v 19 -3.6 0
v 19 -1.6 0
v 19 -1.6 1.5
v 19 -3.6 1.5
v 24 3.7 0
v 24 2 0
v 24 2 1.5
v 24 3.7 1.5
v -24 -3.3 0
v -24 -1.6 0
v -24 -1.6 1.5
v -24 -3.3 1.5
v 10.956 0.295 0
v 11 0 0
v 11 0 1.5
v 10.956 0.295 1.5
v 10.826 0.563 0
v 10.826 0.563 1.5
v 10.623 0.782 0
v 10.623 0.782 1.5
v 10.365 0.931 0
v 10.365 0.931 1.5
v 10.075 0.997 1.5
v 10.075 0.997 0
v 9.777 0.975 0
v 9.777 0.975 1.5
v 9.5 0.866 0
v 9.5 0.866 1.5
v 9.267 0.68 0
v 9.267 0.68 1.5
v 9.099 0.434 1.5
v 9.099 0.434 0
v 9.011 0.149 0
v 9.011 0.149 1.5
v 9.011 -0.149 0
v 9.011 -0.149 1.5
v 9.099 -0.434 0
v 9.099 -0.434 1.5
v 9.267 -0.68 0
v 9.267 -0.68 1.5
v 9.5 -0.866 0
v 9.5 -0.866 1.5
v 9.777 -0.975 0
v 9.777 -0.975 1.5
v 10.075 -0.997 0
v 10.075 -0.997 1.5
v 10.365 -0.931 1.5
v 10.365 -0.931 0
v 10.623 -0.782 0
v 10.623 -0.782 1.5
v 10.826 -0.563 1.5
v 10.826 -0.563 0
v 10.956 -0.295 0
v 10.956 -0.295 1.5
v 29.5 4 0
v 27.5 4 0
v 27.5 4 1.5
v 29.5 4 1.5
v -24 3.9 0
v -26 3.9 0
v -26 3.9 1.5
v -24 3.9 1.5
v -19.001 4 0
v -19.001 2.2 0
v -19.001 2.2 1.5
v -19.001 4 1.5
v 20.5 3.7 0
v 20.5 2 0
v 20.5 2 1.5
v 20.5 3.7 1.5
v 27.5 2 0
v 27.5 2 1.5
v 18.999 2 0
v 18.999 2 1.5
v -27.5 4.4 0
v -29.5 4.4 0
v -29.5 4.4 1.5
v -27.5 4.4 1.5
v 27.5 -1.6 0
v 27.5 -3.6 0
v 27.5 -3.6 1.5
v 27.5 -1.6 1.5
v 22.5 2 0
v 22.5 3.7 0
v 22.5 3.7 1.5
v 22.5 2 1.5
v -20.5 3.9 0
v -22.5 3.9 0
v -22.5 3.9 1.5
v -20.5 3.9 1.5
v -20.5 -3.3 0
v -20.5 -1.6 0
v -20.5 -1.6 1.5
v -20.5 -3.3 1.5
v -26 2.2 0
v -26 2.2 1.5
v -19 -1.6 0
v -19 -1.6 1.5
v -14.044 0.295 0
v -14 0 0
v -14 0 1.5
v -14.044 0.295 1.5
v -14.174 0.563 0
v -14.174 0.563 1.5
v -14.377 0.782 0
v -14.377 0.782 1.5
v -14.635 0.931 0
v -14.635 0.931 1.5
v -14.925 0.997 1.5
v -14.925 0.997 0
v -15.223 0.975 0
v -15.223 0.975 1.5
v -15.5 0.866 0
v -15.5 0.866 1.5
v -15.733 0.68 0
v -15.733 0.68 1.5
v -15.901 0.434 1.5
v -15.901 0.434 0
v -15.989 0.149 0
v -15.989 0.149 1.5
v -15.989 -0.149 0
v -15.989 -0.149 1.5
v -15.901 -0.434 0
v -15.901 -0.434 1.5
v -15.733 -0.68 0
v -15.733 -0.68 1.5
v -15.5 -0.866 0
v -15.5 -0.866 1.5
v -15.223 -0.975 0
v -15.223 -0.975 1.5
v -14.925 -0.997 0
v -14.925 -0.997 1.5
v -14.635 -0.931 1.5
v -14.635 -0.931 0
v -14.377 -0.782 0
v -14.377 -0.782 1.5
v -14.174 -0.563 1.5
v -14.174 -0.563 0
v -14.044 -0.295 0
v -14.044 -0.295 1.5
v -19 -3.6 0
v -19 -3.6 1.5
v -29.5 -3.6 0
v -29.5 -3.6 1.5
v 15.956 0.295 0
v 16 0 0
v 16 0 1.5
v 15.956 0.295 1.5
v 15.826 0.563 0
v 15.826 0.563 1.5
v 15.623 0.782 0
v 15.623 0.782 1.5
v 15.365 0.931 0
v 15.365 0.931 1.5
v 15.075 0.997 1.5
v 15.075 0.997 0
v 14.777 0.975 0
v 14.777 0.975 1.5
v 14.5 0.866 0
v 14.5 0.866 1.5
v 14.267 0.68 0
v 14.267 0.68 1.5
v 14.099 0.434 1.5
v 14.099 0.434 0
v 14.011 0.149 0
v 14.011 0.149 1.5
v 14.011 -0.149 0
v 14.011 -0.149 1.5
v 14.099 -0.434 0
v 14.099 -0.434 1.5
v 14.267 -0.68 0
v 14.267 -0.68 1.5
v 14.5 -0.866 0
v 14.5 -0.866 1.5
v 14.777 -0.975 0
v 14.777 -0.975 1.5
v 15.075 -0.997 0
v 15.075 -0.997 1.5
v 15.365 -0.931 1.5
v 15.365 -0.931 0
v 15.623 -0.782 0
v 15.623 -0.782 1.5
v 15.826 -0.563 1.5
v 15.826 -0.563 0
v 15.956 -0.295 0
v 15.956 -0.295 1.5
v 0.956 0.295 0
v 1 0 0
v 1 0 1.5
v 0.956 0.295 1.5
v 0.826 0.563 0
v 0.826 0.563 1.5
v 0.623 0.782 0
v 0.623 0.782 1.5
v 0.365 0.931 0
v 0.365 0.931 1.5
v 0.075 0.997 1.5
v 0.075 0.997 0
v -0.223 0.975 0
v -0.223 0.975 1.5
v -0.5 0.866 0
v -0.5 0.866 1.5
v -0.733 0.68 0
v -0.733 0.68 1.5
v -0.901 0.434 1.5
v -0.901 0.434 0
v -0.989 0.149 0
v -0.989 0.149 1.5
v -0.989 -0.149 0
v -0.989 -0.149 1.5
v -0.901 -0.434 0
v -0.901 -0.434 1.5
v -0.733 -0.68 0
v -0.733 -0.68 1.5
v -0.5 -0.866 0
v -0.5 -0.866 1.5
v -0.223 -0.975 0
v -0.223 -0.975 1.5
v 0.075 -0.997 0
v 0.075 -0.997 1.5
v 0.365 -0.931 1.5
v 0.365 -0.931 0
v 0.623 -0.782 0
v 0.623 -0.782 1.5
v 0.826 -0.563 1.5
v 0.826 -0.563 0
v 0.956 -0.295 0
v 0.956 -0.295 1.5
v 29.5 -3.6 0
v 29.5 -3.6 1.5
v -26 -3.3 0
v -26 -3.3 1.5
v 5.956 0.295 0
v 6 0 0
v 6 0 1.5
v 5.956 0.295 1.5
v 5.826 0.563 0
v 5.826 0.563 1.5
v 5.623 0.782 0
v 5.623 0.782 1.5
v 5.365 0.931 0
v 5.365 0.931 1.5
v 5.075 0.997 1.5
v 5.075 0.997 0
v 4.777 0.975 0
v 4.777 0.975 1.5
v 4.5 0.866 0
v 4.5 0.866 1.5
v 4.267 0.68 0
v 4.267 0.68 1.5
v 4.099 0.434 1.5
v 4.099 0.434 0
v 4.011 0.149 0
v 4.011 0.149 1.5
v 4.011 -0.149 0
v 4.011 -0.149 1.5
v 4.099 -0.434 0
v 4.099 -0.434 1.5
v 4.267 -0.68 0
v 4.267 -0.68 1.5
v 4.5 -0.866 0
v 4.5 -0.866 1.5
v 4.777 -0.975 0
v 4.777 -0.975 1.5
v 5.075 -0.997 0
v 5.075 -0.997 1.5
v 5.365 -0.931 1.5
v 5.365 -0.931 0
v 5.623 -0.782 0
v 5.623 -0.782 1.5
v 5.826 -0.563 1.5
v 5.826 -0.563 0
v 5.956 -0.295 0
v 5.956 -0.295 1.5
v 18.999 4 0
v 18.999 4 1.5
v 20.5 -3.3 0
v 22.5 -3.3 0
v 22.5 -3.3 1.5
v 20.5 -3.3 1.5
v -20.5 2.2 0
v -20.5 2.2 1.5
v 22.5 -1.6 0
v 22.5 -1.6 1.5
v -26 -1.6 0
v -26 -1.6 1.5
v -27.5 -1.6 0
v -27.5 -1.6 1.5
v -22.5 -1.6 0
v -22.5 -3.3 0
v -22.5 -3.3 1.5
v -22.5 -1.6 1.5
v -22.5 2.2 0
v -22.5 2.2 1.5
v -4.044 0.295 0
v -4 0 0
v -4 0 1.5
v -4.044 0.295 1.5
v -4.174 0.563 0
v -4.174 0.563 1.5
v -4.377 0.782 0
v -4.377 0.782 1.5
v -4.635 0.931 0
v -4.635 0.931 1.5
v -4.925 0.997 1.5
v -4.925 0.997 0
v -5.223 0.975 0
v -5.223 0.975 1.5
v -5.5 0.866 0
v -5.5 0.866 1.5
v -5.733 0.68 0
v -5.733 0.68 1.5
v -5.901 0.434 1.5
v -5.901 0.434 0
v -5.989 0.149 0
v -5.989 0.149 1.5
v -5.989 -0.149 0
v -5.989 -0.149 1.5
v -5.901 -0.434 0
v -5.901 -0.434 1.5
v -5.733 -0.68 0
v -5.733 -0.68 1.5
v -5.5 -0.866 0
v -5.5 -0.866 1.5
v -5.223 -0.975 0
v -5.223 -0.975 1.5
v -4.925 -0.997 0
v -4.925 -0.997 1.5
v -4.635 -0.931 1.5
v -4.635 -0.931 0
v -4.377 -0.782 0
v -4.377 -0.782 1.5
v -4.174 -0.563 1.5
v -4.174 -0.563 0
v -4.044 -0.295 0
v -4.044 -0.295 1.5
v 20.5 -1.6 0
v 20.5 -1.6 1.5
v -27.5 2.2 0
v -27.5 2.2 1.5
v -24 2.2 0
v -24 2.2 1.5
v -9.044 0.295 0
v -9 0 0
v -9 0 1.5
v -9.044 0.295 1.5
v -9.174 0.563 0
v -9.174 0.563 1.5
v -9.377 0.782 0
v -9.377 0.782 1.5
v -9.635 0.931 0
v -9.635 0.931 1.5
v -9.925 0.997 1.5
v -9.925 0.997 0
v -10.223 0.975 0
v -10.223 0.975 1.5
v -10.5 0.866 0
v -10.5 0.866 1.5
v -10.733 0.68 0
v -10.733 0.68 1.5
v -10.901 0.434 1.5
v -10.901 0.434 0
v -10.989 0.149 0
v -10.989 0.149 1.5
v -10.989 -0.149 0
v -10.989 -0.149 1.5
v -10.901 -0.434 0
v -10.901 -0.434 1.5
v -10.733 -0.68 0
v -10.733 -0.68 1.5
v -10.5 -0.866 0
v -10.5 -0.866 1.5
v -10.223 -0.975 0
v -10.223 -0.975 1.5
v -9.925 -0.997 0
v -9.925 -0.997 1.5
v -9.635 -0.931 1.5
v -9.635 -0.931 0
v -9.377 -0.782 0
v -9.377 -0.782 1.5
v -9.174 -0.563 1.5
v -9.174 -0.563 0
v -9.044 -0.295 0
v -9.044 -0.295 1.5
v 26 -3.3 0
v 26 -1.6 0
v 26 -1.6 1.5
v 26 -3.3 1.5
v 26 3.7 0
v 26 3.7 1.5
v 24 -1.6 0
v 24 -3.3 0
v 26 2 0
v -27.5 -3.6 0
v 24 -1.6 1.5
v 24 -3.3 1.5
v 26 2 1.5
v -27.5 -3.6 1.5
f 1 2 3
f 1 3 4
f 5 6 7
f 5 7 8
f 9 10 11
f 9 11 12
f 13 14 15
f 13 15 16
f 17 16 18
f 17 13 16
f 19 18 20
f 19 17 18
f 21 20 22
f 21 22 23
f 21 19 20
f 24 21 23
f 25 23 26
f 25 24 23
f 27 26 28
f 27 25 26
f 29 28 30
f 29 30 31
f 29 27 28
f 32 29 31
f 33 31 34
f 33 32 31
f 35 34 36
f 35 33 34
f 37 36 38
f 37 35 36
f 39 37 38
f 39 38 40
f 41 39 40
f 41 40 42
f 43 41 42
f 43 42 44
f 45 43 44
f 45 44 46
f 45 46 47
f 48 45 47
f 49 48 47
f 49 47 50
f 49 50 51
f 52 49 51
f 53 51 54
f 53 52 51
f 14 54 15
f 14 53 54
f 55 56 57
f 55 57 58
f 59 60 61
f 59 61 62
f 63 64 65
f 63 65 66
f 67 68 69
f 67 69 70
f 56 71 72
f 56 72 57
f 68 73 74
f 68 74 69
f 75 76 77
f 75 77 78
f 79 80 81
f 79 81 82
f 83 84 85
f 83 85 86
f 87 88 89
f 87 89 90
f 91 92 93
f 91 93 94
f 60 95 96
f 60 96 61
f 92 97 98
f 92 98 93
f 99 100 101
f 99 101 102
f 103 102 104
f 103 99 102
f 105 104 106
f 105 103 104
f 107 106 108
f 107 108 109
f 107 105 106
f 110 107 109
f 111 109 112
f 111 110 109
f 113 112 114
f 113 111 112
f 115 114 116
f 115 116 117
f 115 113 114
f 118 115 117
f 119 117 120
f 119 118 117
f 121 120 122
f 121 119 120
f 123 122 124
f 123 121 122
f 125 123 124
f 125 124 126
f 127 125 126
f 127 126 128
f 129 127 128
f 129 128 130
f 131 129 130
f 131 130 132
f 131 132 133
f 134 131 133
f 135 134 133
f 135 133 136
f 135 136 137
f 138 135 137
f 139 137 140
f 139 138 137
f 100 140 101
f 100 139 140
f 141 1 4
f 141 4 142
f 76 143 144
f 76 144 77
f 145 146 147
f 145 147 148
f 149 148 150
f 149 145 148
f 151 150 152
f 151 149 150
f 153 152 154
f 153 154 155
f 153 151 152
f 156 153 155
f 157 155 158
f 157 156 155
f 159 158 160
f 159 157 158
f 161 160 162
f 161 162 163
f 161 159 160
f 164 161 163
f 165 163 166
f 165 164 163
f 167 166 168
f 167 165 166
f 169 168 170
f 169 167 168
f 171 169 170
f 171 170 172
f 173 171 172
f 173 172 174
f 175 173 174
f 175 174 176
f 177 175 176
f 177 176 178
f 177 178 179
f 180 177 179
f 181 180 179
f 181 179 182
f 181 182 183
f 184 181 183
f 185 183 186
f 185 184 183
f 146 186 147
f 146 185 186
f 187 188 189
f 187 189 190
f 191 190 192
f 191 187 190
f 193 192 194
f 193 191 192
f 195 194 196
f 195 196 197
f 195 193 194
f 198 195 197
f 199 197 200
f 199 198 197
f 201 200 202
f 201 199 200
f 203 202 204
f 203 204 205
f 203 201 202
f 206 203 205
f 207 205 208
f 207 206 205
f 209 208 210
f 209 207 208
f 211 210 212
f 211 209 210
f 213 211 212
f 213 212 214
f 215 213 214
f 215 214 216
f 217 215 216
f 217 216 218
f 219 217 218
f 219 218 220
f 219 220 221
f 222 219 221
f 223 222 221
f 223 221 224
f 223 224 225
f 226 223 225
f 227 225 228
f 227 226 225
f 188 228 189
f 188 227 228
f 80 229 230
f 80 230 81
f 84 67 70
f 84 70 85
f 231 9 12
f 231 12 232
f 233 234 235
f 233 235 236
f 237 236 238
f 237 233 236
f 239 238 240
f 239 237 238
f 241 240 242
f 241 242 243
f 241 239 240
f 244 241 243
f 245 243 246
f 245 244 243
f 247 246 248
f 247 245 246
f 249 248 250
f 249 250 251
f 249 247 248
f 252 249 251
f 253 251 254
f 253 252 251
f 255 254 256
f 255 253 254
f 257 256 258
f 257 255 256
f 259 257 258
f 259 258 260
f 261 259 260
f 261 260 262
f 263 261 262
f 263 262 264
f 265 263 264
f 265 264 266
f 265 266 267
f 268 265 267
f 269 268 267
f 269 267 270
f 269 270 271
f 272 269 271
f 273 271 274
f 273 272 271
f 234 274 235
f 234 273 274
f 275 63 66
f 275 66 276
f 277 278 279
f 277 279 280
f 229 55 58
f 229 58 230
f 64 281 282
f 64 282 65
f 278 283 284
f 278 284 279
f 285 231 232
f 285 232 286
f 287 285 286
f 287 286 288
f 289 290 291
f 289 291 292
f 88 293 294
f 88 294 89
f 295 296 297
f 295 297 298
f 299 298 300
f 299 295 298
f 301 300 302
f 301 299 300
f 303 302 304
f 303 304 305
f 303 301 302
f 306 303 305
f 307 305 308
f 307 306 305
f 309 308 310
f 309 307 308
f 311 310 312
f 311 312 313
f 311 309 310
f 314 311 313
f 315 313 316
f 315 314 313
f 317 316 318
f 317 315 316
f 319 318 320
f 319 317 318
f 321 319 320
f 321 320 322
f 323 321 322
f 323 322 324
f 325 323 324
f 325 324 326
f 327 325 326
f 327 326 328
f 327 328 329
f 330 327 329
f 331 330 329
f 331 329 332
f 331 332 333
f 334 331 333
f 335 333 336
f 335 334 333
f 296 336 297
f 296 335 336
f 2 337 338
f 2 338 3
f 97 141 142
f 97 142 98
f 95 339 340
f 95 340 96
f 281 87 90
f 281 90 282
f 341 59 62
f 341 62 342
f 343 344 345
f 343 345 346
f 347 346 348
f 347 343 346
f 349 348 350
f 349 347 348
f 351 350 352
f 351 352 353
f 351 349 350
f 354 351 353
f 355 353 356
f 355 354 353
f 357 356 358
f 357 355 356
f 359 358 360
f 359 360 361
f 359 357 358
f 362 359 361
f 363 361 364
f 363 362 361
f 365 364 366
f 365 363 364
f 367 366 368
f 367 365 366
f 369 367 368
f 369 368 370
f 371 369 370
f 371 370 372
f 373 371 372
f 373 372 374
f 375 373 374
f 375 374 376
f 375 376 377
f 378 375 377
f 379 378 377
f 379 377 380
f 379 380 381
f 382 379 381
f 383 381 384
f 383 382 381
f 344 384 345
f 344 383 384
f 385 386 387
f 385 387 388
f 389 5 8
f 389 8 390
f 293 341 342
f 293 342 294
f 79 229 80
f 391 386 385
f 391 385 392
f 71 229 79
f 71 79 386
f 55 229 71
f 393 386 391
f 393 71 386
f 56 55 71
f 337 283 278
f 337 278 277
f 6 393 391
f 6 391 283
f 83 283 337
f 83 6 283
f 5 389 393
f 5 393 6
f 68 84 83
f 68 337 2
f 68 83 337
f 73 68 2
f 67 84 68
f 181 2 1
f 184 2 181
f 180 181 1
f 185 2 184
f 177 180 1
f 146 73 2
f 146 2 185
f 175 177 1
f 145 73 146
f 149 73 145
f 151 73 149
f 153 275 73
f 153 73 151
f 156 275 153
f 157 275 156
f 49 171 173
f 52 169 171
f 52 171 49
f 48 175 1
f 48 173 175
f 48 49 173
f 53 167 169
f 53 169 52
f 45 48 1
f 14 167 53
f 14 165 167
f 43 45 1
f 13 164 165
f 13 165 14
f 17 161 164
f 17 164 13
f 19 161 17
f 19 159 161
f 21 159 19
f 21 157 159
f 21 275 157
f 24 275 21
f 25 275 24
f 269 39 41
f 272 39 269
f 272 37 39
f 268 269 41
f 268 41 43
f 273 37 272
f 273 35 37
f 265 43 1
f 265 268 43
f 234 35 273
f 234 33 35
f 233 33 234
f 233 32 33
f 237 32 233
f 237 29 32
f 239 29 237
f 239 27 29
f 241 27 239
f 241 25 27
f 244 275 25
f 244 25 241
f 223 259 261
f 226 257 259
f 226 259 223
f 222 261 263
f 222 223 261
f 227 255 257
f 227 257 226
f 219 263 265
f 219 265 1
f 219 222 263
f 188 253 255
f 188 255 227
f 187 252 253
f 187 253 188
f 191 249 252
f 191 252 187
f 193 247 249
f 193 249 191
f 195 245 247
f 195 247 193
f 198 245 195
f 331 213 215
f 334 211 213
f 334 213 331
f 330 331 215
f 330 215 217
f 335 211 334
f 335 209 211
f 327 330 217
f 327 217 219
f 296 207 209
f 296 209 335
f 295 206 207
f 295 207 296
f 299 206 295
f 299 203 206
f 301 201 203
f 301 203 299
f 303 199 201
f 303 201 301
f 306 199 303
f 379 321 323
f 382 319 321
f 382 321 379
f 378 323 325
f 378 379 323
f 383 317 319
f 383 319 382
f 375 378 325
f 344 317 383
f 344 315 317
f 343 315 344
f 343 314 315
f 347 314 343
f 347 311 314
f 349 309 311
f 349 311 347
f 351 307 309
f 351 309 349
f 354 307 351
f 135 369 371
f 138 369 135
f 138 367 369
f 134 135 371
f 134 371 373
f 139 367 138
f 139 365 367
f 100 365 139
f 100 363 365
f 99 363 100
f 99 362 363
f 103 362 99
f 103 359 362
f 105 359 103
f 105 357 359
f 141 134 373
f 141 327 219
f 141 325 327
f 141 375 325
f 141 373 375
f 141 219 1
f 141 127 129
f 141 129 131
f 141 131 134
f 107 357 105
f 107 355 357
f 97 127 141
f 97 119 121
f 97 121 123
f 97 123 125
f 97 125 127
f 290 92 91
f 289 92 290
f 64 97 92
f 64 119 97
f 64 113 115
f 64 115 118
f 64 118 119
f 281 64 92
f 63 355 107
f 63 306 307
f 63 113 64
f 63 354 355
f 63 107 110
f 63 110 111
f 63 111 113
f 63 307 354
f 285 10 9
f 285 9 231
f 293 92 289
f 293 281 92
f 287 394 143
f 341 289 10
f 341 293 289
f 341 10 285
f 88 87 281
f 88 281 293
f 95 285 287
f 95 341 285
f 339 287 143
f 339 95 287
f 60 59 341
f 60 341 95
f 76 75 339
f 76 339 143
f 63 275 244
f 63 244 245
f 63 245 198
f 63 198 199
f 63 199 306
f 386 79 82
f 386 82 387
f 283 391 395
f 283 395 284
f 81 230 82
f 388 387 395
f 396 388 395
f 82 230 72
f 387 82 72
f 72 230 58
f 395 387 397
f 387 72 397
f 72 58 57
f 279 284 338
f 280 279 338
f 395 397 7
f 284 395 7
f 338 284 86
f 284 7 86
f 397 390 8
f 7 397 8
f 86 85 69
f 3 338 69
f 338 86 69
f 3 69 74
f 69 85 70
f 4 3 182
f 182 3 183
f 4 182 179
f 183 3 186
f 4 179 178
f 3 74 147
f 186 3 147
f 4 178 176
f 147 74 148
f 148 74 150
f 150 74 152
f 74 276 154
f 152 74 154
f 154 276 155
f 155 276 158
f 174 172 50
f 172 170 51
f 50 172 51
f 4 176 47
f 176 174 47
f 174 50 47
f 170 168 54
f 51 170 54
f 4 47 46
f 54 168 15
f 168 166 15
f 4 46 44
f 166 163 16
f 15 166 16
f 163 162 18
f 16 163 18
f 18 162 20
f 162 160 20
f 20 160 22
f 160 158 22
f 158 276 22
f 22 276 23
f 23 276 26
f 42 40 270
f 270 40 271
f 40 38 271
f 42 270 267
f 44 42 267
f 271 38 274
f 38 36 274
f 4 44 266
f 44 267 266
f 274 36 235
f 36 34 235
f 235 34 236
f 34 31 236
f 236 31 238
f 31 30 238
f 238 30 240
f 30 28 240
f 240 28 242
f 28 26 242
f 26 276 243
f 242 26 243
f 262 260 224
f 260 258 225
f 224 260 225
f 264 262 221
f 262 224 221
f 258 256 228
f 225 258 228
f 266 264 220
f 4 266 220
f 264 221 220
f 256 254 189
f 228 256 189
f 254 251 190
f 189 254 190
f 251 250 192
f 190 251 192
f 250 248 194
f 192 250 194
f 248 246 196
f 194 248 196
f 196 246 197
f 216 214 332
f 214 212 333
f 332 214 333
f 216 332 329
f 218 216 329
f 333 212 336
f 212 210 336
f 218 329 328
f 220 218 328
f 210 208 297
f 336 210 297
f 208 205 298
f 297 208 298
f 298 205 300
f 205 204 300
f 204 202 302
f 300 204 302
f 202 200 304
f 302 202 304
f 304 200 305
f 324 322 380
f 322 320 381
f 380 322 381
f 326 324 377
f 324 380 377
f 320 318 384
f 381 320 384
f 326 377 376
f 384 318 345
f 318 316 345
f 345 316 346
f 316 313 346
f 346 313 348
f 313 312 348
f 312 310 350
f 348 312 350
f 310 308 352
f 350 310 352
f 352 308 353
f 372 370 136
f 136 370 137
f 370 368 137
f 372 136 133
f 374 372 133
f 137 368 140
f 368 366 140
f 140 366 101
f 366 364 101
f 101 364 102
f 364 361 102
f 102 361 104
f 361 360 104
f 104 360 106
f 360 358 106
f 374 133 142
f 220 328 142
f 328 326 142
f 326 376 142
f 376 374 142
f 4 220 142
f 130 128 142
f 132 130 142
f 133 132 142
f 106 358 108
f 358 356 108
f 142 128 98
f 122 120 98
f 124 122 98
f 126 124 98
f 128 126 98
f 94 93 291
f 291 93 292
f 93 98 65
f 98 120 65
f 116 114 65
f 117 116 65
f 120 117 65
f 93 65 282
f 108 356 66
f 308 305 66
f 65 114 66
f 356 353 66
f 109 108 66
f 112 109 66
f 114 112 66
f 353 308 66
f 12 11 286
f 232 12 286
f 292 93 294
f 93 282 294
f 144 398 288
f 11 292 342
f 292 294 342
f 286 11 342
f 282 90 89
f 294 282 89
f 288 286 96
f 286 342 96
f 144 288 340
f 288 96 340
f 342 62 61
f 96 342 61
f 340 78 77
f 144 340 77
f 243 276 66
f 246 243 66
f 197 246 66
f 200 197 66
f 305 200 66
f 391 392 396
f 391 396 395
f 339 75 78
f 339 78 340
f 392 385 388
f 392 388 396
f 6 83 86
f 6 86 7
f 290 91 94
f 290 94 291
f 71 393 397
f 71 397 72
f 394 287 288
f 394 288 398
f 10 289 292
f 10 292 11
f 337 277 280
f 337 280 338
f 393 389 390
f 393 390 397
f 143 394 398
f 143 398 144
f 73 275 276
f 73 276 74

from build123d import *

# Parameters (mm, degrees)
SKETCH_1_R      = 1
EXTRUDE_1_DEPTH = 1.5


with BuildPart() as part:
    # 草图1 → 凸台-拉伸1 (new body)
    with BuildSketch(Plane.XY):
        Polygon((-19.000504276, 4), (18.999495724, 4), (18.999495724, 2), (20.5, 2), (20.5, 3.7), (22.499555553, 3.7), (22.499555553, 2), (24.00005983, 2), (24.00005983, 3.7), (25.999615383, 3.7), (25.999615383, 2), (27.50011966, 2), (27.50011966, 4), (29.499675213, 4), (29.499675213, -3.6), (27.5, -3.6), (27.5, -1.6), (26, -1.6), (26, -3.3), (24, -3.3), (24, -1.6), (22.5, -1.6), (22.5, -3.3), (20.5, -3.3), (20.5, -1.6), (19, -1.6), (19, -3.6), (-19, -3.6), (-19, -1.6), (-20.5, -1.6), (-20.5, -3.3), (-22.5, -3.3), (-22.5, -1.6), (-24, -1.6), (-24, -3.3), (-26, -3.3), (-26, -1.6), (-27.5, -1.6), (-27.5, -3.6), (-29.5, -3.6), (-29.5, 4.4), (-27.5, 4.4), (-27.5, 2.2), (-26, 2.2), (-26, 3.9), (-24, 3.9), (-24, 2.2), (-22.5, 2.2), (-22.5, 3.9), (-20.5, 3.9), (-20.5, 2.2), (-19.000504276, 2.2), align=None)
        Circle(SKETCH_1_R, mode=Mode.SUBTRACT)
        with Locations((5, 0)):
            Circle(SKETCH_1_R, mode=Mode.SUBTRACT)
        with Locations((10, 0)):
            Circle(SKETCH_1_R, mode=Mode.SUBTRACT)
        with Locations((15, 0)):
            Circle(SKETCH_1_R, mode=Mode.SUBTRACT)
        with Locations((-5, 0)):
            Circle(SKETCH_1_R, mode=Mode.SUBTRACT)
        with Locations((-10, 0)):
            Circle(SKETCH_1_R, mode=Mode.SUBTRACT)
        with Locations((-15, 0)):
            Circle(SKETCH_1_R, mode=Mode.SUBTRACT)
    extrude(amount=EXTRUDE_1_DEPTH)


solid = part.part
